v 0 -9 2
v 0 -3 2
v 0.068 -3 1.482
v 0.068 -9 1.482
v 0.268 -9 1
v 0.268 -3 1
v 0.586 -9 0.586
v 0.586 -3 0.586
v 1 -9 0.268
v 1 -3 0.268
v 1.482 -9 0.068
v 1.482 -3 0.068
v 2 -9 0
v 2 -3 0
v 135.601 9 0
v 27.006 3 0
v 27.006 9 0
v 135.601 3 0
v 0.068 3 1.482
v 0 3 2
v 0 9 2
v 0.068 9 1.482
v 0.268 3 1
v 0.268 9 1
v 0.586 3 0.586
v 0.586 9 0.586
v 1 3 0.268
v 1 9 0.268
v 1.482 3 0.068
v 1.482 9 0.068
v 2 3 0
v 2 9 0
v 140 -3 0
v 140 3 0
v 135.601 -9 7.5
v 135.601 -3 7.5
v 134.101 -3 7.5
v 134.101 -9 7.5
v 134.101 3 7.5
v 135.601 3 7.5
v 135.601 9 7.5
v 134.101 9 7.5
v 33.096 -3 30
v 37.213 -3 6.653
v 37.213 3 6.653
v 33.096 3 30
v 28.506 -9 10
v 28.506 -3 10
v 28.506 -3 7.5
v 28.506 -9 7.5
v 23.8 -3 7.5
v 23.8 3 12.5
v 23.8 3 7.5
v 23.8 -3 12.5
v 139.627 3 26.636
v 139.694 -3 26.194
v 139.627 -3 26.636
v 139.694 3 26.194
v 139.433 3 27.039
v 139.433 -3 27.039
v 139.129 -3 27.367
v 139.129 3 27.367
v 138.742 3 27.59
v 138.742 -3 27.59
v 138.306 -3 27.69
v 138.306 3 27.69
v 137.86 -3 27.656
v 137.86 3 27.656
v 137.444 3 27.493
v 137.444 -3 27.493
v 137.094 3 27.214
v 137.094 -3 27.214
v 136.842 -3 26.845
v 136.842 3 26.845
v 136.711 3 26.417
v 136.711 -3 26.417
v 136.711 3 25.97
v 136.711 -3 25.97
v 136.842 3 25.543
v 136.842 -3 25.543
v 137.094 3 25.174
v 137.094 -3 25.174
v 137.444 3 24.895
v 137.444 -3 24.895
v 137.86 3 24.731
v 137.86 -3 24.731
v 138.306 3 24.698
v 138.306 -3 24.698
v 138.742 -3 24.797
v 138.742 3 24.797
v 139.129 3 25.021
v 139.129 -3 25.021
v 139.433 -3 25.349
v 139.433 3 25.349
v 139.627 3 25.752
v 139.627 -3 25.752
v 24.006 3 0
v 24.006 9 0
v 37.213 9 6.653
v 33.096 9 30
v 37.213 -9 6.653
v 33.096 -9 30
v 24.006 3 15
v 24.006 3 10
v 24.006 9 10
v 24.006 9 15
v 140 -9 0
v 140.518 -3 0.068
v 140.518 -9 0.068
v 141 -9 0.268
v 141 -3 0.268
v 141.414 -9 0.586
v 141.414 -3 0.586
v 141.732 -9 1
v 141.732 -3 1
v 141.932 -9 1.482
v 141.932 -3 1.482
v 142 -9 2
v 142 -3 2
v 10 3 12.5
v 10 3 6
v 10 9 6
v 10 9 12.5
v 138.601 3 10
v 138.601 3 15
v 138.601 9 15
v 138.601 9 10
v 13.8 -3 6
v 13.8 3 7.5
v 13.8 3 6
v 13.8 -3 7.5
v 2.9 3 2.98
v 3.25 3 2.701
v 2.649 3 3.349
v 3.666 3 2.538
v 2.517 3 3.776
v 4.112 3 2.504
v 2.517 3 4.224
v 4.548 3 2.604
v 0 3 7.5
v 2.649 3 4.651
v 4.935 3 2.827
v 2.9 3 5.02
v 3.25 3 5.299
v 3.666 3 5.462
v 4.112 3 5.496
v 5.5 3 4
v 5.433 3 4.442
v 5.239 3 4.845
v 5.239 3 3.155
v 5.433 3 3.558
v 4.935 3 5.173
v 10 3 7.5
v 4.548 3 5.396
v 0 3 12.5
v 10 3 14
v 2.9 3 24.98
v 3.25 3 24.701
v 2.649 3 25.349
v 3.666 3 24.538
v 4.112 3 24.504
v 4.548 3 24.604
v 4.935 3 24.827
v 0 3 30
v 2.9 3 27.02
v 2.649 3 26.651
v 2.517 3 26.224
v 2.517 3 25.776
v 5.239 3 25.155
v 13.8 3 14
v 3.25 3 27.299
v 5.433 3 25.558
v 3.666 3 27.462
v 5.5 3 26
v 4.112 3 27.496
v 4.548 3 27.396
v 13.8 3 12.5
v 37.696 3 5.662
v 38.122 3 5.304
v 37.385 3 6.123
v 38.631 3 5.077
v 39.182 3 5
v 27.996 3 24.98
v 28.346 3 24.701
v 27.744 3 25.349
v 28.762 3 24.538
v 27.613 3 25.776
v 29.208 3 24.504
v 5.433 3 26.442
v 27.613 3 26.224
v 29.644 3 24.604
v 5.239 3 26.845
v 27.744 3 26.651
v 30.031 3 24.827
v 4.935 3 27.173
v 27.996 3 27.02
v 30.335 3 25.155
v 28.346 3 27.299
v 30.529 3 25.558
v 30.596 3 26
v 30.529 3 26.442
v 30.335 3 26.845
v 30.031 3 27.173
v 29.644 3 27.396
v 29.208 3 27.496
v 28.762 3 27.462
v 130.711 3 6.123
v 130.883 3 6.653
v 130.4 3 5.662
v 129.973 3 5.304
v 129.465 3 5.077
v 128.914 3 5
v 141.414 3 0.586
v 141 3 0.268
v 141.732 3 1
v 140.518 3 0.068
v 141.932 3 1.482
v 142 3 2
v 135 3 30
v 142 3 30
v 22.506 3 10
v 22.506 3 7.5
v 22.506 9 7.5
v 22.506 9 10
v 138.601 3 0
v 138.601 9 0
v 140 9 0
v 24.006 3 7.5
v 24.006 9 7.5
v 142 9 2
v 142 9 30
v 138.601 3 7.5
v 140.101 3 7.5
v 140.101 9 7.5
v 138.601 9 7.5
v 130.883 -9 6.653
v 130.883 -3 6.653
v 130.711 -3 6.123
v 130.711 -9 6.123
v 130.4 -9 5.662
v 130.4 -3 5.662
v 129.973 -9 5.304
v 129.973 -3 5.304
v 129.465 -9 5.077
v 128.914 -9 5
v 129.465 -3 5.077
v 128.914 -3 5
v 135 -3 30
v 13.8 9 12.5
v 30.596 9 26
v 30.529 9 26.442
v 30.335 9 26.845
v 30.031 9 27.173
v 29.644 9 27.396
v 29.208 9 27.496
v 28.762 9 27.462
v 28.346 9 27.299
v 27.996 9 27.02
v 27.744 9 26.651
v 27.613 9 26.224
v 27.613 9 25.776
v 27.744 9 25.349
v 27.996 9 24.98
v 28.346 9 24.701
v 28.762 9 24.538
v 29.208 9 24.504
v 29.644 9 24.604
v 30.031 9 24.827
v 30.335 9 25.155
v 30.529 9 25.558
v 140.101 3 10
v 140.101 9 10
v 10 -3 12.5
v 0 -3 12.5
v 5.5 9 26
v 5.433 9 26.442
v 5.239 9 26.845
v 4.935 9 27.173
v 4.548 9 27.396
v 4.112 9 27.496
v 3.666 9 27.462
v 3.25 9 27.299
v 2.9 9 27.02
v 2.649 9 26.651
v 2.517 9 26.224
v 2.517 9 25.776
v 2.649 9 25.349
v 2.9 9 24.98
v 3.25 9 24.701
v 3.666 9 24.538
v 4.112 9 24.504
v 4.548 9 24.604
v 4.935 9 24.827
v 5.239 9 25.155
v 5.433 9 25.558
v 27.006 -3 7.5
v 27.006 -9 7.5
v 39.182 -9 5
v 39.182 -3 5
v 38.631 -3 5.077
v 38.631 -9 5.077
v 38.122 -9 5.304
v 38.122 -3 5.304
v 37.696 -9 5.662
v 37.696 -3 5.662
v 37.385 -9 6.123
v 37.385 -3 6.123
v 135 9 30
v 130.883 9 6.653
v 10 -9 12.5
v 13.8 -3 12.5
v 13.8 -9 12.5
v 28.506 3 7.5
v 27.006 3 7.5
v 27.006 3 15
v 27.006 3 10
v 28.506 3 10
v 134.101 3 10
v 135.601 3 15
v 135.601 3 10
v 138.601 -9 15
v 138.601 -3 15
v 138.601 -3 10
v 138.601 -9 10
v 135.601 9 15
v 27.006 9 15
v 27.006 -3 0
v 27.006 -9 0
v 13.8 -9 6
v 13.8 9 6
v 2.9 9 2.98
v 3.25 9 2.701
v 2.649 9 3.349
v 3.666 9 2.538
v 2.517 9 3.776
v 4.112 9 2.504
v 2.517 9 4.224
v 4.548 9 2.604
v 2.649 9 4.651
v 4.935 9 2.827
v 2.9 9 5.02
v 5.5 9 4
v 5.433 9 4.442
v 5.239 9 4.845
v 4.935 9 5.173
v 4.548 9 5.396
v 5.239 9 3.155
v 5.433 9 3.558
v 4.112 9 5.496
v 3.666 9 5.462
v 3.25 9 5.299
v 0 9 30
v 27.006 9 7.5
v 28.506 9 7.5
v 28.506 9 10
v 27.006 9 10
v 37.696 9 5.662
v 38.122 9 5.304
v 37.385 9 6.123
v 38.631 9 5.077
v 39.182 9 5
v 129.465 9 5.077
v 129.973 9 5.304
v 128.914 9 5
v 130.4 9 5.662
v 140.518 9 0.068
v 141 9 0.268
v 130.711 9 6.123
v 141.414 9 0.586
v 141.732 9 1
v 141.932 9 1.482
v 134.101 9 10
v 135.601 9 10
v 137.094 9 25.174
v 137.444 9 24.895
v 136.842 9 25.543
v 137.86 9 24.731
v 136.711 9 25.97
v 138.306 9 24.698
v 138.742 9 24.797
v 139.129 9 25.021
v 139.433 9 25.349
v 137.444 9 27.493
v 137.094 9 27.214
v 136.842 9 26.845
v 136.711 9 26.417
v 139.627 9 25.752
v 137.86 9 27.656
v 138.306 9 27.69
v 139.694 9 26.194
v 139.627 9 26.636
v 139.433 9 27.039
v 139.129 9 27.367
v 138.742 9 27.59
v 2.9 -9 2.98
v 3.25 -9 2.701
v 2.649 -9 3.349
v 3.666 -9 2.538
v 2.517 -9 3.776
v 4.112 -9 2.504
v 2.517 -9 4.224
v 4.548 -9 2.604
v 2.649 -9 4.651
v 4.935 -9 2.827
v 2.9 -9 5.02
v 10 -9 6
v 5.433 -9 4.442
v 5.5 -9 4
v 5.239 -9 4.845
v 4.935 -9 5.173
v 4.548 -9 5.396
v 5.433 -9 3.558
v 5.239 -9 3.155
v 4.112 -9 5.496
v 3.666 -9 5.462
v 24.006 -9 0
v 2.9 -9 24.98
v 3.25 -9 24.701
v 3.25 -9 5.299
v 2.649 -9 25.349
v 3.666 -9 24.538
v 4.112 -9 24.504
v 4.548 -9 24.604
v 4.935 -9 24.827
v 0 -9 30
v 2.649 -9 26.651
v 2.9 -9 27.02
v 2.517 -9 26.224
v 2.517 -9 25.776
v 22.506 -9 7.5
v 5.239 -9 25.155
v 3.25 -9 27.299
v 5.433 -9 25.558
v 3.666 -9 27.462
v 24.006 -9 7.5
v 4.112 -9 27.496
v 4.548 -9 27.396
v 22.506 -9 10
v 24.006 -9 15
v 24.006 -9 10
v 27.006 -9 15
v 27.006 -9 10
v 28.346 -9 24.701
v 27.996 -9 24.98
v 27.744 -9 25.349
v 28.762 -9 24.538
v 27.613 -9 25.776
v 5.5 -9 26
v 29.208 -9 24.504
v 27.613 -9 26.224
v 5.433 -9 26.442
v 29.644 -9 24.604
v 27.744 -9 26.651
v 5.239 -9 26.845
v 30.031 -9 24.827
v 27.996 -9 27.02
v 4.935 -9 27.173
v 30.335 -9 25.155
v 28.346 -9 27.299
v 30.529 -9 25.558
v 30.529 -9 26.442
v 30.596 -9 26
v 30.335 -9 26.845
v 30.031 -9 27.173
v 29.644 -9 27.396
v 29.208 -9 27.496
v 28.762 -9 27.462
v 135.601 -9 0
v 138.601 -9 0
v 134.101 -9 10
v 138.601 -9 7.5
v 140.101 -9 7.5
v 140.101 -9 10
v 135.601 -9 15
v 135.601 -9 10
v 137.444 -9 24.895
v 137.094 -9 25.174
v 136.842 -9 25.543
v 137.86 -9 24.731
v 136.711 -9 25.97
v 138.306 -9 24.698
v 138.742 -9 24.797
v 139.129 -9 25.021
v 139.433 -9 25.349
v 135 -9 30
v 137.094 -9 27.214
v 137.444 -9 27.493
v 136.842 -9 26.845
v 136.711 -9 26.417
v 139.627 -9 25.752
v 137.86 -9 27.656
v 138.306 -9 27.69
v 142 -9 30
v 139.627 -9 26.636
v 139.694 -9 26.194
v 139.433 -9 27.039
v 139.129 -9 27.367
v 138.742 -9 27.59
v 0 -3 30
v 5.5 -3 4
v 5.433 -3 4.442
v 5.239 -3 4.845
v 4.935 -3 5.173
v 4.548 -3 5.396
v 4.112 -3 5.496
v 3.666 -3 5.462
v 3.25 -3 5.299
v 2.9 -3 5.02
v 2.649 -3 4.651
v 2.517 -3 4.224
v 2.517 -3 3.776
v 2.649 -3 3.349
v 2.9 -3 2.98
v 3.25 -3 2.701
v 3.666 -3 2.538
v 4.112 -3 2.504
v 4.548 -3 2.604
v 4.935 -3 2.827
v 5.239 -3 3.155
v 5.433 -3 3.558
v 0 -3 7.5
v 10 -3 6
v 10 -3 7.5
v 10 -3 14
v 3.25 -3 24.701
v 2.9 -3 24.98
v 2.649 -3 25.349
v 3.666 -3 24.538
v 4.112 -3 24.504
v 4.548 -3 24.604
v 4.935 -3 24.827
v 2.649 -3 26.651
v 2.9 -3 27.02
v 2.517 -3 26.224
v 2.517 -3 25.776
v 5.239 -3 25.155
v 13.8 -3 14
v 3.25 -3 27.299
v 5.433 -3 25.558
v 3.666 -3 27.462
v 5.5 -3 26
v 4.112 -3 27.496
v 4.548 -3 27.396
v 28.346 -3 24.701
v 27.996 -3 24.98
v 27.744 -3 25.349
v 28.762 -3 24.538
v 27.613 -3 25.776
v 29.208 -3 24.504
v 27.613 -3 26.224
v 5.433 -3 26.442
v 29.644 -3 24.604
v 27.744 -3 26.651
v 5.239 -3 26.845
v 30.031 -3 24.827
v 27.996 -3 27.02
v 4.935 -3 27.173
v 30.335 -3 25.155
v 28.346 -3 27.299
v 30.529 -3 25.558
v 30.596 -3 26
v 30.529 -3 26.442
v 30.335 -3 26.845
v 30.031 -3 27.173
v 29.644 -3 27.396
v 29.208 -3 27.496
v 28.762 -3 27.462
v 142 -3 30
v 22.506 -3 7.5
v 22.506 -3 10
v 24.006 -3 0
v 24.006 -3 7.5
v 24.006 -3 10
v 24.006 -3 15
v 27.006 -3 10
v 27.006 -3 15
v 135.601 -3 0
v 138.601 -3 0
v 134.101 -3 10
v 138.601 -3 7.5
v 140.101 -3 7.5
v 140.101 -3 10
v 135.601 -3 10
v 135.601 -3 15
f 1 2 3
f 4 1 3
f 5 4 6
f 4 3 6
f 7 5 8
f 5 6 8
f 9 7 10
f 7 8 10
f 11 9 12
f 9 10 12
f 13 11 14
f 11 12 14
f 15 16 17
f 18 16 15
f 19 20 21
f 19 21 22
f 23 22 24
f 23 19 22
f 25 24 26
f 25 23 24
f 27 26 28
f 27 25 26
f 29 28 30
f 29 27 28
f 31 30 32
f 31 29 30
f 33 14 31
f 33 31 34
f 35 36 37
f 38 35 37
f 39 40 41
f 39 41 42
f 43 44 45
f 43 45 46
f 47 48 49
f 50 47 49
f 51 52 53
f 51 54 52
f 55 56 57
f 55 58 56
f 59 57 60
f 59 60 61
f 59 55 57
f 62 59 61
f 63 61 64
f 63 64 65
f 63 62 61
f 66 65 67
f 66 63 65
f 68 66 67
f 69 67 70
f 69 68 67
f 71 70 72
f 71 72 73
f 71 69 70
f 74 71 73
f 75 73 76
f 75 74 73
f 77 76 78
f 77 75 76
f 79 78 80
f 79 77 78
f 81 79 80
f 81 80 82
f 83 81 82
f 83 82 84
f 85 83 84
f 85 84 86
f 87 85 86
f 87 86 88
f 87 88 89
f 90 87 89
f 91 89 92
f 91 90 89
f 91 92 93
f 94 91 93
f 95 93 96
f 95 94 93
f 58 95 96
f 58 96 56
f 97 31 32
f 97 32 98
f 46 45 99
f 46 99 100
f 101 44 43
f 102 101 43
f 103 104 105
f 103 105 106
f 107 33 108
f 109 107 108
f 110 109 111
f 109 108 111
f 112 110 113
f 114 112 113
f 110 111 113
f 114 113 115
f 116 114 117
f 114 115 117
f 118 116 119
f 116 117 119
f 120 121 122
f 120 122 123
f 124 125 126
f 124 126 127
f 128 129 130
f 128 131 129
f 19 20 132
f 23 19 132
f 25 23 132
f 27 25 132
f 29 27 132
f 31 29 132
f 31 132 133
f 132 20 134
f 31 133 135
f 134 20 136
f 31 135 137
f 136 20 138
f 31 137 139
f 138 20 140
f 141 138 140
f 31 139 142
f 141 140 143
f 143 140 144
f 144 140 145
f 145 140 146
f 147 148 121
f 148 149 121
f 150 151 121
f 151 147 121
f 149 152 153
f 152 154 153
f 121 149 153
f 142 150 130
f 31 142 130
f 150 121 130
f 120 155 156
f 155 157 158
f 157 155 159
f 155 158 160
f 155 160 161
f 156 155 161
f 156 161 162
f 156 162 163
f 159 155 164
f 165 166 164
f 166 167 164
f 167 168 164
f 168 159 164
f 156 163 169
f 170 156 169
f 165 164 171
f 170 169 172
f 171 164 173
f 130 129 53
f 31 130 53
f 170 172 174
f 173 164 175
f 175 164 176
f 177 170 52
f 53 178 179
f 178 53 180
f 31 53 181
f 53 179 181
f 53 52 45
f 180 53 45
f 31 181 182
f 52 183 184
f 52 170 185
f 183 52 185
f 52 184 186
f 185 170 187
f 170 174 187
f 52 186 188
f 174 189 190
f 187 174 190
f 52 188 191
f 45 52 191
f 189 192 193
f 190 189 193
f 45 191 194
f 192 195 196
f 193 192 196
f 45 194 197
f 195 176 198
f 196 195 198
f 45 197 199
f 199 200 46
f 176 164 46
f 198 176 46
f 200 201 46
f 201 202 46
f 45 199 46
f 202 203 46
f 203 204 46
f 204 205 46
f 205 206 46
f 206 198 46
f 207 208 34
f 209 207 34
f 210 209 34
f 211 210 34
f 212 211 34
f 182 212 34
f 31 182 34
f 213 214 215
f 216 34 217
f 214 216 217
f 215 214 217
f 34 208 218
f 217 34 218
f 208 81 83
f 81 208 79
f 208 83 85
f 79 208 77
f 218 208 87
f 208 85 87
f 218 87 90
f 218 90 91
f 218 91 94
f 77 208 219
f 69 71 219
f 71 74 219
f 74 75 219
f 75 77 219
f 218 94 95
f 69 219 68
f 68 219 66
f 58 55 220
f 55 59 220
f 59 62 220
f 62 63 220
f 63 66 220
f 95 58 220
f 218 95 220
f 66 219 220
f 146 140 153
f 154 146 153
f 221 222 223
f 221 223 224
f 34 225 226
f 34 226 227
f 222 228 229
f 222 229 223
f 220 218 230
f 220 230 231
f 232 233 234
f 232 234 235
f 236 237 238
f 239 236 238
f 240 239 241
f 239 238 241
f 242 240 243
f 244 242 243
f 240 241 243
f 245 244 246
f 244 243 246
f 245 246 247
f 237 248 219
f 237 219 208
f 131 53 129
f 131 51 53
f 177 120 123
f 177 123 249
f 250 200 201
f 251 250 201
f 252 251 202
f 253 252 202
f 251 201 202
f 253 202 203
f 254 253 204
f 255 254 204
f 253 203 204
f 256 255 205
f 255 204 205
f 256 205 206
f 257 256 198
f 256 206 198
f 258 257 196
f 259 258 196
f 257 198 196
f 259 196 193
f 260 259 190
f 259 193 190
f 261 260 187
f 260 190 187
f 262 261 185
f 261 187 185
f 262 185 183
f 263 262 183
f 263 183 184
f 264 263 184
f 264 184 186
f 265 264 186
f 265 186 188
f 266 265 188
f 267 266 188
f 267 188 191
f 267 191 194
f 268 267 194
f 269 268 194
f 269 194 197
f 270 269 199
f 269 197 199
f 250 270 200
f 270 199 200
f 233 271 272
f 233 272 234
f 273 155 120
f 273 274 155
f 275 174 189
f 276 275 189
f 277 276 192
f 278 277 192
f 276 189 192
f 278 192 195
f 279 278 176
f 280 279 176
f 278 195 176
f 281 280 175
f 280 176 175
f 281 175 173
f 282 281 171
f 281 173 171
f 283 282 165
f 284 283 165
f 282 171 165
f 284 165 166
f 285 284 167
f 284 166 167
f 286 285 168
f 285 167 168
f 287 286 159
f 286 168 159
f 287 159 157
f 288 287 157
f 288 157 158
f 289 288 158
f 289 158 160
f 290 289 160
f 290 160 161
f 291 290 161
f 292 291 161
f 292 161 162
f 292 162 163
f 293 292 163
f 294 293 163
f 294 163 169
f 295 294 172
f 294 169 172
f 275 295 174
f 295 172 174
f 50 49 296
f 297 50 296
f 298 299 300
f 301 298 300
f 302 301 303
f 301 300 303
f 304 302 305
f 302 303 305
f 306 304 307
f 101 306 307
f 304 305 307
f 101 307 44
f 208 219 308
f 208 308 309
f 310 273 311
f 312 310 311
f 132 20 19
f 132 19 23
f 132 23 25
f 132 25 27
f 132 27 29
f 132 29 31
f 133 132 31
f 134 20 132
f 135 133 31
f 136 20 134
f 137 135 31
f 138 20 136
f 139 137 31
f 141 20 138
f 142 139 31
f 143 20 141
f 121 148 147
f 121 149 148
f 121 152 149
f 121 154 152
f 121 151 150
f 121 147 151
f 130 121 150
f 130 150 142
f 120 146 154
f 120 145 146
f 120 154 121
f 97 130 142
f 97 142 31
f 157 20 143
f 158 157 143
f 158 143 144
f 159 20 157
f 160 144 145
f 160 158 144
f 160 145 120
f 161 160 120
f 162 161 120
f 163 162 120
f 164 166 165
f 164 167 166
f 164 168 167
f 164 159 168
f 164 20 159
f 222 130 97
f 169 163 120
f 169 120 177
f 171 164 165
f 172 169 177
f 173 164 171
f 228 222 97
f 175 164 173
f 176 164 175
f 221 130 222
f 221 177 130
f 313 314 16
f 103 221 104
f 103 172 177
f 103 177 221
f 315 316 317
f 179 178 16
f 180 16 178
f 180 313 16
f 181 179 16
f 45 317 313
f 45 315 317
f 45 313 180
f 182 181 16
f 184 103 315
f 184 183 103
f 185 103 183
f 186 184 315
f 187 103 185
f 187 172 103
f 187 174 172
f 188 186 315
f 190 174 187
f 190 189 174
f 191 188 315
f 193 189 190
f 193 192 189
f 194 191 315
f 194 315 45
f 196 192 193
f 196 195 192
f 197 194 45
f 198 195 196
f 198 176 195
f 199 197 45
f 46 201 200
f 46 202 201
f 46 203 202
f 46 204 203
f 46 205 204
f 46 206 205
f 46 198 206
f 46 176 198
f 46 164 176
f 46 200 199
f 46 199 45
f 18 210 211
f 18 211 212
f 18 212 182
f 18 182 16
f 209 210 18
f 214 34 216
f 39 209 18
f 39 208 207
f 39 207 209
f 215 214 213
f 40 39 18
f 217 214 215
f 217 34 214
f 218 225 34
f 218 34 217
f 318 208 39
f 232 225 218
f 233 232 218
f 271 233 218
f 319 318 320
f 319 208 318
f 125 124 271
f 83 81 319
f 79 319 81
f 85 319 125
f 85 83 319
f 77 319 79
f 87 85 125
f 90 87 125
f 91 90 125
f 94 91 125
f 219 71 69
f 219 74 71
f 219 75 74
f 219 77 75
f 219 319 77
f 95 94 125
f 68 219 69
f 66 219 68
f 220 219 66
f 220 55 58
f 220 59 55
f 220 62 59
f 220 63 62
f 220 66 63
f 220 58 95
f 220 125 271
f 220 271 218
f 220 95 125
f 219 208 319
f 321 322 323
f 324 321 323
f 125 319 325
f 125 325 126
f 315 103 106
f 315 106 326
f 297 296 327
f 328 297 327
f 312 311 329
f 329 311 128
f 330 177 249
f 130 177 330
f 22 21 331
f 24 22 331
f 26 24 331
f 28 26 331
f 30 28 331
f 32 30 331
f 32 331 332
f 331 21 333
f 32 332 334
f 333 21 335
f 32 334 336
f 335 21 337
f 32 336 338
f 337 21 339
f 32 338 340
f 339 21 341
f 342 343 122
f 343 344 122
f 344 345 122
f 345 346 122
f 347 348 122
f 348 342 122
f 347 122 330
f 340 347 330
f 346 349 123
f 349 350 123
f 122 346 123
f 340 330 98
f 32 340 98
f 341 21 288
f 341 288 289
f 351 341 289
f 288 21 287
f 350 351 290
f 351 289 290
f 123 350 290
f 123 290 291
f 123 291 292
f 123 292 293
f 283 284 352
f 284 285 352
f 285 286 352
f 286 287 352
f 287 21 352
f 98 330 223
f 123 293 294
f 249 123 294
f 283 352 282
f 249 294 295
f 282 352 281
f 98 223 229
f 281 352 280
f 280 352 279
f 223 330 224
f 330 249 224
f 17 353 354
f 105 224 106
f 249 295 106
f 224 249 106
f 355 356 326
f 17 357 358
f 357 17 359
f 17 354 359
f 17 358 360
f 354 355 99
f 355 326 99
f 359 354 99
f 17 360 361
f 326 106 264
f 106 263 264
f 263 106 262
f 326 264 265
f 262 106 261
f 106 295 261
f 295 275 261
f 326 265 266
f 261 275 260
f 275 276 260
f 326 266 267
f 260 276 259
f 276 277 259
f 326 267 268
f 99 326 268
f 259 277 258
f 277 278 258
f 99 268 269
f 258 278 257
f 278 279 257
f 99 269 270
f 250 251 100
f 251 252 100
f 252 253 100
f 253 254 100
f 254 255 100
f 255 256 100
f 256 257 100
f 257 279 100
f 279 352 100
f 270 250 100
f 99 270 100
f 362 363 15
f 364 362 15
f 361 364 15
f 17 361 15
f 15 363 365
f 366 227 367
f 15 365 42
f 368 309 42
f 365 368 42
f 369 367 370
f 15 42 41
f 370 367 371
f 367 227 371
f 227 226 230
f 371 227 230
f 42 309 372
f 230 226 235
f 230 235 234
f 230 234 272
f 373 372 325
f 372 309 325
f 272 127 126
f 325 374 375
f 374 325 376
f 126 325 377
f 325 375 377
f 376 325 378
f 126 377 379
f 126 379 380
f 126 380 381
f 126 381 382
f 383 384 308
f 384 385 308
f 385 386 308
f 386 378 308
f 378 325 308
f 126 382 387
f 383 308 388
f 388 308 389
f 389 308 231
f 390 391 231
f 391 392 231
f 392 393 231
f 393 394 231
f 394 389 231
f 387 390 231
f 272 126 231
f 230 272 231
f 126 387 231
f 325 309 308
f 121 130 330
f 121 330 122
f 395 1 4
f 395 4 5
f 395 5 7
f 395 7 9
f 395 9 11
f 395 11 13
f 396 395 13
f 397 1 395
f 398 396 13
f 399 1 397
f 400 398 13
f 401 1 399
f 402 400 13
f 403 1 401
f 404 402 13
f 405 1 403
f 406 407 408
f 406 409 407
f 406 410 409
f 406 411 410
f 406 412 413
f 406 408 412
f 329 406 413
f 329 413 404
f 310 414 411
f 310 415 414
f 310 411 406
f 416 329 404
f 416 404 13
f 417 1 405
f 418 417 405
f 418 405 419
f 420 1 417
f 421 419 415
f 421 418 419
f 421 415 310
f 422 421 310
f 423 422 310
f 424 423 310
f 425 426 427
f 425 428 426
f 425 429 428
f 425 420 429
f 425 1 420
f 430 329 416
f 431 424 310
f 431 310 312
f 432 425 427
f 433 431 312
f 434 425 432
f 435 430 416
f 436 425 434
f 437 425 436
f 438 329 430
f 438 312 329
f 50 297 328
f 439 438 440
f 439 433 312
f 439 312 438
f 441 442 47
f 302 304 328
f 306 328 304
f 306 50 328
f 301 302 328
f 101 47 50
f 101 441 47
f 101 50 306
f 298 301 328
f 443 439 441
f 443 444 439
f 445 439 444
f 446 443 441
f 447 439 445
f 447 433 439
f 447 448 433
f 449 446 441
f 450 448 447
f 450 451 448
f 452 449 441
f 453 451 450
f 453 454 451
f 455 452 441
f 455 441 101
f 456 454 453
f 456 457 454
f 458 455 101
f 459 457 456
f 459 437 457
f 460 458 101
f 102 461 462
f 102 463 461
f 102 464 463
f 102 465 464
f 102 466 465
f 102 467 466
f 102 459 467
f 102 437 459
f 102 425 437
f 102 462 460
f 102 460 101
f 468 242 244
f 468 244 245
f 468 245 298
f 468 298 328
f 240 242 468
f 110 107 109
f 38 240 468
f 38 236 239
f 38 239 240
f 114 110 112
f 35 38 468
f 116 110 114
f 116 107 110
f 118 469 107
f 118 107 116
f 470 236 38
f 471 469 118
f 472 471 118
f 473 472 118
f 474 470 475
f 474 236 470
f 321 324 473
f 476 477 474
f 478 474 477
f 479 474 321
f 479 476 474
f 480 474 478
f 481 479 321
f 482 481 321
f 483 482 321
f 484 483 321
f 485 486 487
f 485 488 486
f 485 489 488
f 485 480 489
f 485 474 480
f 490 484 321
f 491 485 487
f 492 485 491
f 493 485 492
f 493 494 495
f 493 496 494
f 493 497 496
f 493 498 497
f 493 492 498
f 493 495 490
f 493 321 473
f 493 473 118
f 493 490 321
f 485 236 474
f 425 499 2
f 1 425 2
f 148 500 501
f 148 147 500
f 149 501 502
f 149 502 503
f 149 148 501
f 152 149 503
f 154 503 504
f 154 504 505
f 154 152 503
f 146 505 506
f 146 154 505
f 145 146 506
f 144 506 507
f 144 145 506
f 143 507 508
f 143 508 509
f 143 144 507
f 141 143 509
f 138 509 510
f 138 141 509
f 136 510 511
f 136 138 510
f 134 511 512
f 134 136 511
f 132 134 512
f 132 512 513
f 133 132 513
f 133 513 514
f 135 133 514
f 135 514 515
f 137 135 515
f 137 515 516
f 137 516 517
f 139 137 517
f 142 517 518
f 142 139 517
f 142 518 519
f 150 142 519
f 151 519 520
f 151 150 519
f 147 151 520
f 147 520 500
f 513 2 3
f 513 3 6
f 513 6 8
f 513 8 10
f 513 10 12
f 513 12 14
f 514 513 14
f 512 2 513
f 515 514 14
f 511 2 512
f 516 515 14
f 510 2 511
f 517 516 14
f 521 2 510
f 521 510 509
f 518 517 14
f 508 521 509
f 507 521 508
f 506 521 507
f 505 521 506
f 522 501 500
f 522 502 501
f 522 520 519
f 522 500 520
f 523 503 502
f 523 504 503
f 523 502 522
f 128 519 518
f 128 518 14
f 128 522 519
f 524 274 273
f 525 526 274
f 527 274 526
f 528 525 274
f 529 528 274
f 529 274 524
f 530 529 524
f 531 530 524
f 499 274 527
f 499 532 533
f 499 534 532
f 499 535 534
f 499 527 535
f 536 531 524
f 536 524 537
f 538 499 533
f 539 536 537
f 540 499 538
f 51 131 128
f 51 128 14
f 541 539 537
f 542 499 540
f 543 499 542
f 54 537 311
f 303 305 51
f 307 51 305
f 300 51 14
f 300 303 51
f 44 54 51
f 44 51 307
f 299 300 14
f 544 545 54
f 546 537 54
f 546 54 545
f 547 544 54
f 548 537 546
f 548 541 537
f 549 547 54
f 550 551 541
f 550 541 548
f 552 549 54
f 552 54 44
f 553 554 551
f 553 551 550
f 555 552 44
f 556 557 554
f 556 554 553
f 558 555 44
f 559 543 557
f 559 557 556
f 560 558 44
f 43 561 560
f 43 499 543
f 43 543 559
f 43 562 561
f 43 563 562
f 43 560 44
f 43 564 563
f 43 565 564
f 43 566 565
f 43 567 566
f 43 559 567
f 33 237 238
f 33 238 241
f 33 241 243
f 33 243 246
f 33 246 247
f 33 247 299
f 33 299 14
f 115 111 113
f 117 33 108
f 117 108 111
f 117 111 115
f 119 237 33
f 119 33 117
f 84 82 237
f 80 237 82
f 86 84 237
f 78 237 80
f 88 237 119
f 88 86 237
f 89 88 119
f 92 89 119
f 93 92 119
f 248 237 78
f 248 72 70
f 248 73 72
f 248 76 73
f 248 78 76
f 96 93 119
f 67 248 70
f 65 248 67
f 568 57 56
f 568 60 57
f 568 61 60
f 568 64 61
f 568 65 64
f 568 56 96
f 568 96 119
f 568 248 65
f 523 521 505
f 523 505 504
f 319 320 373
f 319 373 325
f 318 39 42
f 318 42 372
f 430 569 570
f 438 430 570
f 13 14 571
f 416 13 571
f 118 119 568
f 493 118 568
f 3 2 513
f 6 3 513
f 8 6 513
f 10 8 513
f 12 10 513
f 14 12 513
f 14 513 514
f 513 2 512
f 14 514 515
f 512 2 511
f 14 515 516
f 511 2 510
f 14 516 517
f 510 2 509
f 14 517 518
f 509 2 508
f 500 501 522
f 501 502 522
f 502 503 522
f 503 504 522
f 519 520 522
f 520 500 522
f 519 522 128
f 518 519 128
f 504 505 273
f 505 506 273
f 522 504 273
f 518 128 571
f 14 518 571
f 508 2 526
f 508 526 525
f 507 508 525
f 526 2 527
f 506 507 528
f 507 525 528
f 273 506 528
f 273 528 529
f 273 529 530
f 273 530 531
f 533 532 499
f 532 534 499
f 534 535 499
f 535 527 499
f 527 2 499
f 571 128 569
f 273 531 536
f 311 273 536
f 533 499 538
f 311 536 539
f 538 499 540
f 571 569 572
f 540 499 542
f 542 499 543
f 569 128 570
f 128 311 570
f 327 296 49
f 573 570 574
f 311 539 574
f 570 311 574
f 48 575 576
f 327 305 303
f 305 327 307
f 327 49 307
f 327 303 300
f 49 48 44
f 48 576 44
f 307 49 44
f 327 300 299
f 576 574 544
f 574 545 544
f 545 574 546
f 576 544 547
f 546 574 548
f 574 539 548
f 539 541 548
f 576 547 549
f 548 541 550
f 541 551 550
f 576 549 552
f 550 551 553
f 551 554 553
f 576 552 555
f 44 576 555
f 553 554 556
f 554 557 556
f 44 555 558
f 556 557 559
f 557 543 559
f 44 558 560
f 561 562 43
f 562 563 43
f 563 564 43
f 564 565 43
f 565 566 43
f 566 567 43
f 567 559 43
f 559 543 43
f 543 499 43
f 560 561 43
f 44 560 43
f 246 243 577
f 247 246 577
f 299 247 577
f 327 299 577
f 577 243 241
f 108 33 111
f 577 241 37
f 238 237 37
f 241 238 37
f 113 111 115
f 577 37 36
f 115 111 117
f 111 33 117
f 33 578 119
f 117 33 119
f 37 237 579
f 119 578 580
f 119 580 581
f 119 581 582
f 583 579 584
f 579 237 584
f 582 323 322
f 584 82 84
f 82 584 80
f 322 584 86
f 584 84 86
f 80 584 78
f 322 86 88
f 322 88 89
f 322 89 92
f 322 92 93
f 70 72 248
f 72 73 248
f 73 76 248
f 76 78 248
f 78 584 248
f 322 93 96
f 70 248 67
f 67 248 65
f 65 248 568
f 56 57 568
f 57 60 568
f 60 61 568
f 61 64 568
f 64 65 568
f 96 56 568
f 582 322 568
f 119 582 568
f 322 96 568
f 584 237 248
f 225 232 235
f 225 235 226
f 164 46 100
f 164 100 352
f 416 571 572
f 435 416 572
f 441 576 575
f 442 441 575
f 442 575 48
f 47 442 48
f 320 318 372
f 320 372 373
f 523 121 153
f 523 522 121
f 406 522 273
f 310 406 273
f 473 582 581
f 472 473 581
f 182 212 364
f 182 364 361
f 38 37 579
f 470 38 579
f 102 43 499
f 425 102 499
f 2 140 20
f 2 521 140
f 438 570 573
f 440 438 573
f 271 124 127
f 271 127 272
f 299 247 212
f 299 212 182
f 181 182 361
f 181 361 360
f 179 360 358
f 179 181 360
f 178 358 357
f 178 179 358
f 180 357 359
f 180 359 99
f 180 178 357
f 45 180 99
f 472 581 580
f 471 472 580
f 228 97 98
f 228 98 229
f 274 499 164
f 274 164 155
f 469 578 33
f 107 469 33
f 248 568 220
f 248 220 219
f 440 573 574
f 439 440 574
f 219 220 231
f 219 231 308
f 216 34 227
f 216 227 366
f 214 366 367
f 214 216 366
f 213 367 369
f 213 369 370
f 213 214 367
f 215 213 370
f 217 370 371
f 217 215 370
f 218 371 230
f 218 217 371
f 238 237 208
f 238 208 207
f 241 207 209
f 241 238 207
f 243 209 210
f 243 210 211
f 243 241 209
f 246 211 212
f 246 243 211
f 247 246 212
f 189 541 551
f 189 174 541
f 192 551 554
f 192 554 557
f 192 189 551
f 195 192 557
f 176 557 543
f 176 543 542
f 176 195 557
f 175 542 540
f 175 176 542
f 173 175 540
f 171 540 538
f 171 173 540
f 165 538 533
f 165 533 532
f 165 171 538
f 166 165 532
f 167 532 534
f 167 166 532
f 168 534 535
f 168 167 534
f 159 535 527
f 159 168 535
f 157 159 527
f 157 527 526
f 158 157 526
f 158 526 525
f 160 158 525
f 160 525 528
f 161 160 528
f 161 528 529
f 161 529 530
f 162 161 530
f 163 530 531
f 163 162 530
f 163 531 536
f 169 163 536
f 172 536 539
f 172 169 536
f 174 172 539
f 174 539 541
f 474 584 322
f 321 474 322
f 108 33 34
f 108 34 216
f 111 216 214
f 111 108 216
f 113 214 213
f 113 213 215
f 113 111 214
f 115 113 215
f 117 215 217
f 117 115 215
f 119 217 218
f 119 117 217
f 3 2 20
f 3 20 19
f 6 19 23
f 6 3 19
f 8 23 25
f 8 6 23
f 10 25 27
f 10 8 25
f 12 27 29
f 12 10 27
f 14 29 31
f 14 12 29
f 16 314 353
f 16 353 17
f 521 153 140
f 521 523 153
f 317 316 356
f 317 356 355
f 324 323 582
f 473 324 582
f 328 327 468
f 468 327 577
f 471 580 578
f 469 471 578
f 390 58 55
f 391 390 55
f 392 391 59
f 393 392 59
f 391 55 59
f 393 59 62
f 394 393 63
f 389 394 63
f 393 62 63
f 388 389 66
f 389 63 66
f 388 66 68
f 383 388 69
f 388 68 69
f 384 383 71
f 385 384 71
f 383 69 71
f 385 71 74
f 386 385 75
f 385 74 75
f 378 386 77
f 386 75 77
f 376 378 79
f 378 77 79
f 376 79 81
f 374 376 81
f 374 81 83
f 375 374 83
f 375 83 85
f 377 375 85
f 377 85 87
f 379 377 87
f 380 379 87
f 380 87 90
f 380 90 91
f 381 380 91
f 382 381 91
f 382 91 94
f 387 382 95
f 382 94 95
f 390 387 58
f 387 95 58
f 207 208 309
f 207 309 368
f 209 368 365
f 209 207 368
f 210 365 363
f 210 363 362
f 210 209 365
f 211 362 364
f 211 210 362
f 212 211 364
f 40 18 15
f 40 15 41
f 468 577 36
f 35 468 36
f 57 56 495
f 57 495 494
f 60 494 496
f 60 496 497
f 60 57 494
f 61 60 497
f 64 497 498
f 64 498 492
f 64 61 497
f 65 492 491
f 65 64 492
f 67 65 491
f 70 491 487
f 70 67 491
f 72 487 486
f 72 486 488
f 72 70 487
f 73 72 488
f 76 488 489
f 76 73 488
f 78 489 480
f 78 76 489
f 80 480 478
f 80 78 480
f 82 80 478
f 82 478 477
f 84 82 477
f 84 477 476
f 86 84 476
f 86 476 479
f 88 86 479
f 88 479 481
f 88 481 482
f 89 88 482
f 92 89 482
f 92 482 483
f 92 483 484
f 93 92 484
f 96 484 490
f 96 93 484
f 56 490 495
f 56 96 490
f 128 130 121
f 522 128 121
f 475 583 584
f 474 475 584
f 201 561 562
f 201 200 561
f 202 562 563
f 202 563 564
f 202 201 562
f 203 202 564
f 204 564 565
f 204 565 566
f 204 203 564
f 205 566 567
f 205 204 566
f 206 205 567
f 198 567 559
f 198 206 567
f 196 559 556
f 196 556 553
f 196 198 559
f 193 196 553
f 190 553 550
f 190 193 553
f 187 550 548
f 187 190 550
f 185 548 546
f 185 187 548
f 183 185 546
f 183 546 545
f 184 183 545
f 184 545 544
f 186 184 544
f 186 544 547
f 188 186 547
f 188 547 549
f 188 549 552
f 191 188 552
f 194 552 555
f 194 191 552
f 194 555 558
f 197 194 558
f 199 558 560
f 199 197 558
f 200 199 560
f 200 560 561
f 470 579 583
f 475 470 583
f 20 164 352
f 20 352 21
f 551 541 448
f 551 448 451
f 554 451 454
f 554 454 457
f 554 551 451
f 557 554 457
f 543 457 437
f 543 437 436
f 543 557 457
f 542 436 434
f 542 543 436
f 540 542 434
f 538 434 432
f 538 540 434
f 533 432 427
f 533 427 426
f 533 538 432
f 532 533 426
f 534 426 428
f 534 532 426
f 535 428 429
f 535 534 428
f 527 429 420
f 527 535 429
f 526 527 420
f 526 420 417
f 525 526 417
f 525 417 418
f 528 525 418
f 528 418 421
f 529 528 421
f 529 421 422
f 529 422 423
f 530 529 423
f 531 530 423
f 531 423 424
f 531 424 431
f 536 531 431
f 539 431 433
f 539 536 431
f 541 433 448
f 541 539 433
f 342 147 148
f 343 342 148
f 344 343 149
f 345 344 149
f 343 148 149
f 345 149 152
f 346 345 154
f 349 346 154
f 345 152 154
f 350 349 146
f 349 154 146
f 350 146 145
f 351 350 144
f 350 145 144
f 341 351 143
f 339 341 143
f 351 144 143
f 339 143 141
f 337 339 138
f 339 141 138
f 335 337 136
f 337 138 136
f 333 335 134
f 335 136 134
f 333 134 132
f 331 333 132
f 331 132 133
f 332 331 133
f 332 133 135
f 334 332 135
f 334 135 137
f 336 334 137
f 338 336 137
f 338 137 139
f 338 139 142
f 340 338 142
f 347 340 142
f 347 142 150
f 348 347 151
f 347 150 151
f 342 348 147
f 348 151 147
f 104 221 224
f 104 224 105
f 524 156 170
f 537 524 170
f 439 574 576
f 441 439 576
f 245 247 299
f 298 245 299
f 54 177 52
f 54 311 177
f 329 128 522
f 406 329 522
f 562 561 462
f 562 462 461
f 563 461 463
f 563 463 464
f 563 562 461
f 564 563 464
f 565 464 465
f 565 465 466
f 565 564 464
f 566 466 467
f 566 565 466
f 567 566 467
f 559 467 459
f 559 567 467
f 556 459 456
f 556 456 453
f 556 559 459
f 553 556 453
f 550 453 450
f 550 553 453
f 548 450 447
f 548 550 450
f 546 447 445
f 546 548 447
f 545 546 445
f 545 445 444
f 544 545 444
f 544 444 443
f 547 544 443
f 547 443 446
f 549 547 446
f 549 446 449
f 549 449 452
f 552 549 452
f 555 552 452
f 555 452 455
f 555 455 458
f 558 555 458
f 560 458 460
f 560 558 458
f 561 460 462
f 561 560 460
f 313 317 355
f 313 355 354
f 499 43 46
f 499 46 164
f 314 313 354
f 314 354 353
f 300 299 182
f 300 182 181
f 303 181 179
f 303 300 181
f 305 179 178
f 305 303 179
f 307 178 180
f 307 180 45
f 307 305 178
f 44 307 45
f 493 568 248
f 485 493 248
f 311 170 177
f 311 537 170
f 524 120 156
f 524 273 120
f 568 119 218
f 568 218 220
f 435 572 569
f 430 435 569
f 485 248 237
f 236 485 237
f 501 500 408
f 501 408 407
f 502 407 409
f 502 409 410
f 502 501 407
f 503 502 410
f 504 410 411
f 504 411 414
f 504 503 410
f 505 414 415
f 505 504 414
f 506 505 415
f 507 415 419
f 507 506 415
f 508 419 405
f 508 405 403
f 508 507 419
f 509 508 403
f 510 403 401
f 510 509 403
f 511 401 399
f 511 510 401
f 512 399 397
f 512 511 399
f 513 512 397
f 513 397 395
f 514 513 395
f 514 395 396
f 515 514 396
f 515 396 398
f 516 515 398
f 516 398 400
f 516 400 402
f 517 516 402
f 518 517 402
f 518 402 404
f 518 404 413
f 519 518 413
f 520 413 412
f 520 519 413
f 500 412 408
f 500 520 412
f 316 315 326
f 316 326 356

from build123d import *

# Parameters (mm, degrees)
F0_R     = 1.5
F1_DEPTH = 3
F2_R     = 1.5
F2_W     = 10
F2_H     = 5
F2_W_2   = 3.8
F2_H_2   = 1.5
F3_DEPTH = 6


with BuildPart() as f1:
    # F0 (on Front) → F1 (new body, symmetric)
    with BuildSketch(Plane.XZ):
        with BuildLine():
            Line((0, 7.5), (0, 2))
            ThreePointArc((0, 2), (0.5857864376, 0.5857864376), (2, 0))
            Line((2, 0), (140, 0))
            ThreePointArc((140, 0), (141.4142135624, 0.5857864376), (142, 2))
            Line((142, 2), (142, 30))
            Line((142, 30), (135, 30))
            Line((135, 30), (130.883241726, 6.6527036447))
            ThreePointArc((130.883241726, 6.6527036447), (130.1992014393, 5.4679111138), (128.9136262199, 5))
            Line((128.9136262199, 5), (39.1822865212, 5))
            ThreePointArc((39.1822865212, 5), (37.8967113018, 5.4679111138), (37.2126710152, 6.6527036447))
            Line((37.2126710152, 6.6527036447), (33.0959127411, 30))
            Line((33.0959127411, 30), (0, 30))
            Line((0, 30), (0, 12.5))
            Line((0, 12.5), (10, 12.5))
            Line((10, 12.5), (10, 14))
            Line((10, 14), (13.8, 14))
            Line((13.8, 14), (13.8, 12.5))
            Line((13.8, 12.5), (23.8, 12.5))
            Line((23.8, 12.5), (23.8, 7.5))
            Line((23.8, 7.5), (13.8, 7.5))
            Line((13.8, 7.5), (13.8, 6))
            Line((13.8, 6), (10, 6))
            Line((10, 6), (10, 7.5))
            Line((10, 7.5), (0, 7.5))
        make_face()
        with Locations((4, 4)):
            Circle(F0_R, mode=Mode.SUBTRACT)
        with Locations((4, 26)):
            Circle(F0_R, mode=Mode.SUBTRACT)
        with Locations((29.0959127411, 26)):
            Circle(F0_R, mode=Mode.SUBTRACT)
        with Locations((138.1937896777, 26.1937896777)):
            Circle(F0_R, mode=Mode.SUBTRACT)
    extrude(amount=F1_DEPTH, both=True)


with BuildPart() as f3:
    # F2 (on face) → F3 (new body)
    with BuildSketch(Plane.XZ.offset(3)):
        with BuildLine():
            Line((33.0959127411, 30), (0, 30))
            Line((0, 30), (0, 12.5))
            Line((0, 12.5), (10, 12.5))
            Line((10, 12.5), (10, 14))
            Line((10, 14), (13.8, 14))
            Line((13.8, 14), (13.8, 12.5))
            Line((13.8, 12.5), (23.8, 12.5))
            Line((23.8, 12.5), (23.8, 10))
            Line((23.8, 10), (24.0063355076, 10))
            Line((24.0063355076, 10), (24.0063355076, 15))
            Line((24.0063355076, 15), (27.0063355076, 15))
            Line((27.0063355076, 15), (27.0063355076, 10))
            Line((27.0063355076, 10), (28.5063355076, 10))
            Line((28.5063355076, 10), (28.5063355076, 7.5))
            Line((28.5063355076, 7.5), (27.0063355076, 7.5))
            Line((27.0063355076, 7.5), (27.0063355076, 0))
            Line((27.0063355076, 0), (135.6005855076, 0))
            Line((135.6005855076, 0), (135.6005855076, 7.5))
            Line((135.6005855076, 7.5), (134.1005855076, 7.5))
            Line((134.1005855076, 7.5), (134.1005855076, 10))
            Line((134.1005855076, 10), (135.6005855076, 10))
            Line((135.6005855076, 10), (135.6005855076, 15))
            Line((135.6005855076, 15), (138.6005855076, 15))
            Line((138.6005855076, 15), (138.6005855076, 10))
            Line((138.6005855076, 10), (140.1005855076, 10))
            Line((140.1005855076, 10), (140.1005855076, 7.5))
            Line((140.1005855076, 7.5), (138.6005855076, 7.5))
            Line((138.6005855076, 7.5), (138.6005855076, 0))
            Line((138.6005855076, 0), (140, 0))
            ThreePointArc((140, 0), (141.4142135624, 0.5857864376), (142, 2))
            Line((142, 2), (142, 30))
            Line((142, 30), (135, 30))
            Line((135, 30), (130.883241726, 6.6527036447))
            ThreePointArc((130.883241726, 6.6527036447), (130.1992014393, 5.4679111138), (128.9136262199, 5))
            Line((128.9136262199, 5), (39.1822865212, 5))
            ThreePointArc((39.1822865212, 5), (37.8967113018, 5.4679111138), (37.2126710152, 6.6527036447))
            Line((37.2126710152, 6.6527036447), (33.0959127411, 30))
        make_face()
        with Locations((4, 26)):
            Circle(F2_R, mode=Mode.SUBTRACT)
        with Locations((29.0959127411, 26)):
            Circle(F2_R, mode=Mode.SUBTRACT)
        with Locations((138.1937896777, 26.1937896777)):
            Circle(F2_R, mode=Mode.SUBTRACT)
        with Locations((5, 10)):
            Rectangle(F2_W, F2_H)
        with Locations((11.9, 13.25)):
            Rectangle(F2_W_2, F2_H_2)
        Polygon((23.8, 12.5), (13.8, 12.5), (13.8, 7.5), (22.5063355076, 7.5), (22.5063355076, 10), (23.8, 10), align=None)
        with BuildLine():
            Line((10, 7.5), (0, 7.5))
            Line((0, 7.5), (0, 2))
            ThreePointArc((0, 2), (0.5857864376, 0.5857864376), (2, 0))
            Line((2, 0), (24.0063355076, 0))
            Line((24.0063355076, 0), (24.0063355076, 7.5))
            Line((24.0063355076, 7.5), (23.8, 7.5))
            Line((23.8, 7.5), (22.5063355076, 7.5))
            Line((22.5063355076, 7.5), (13.8, 7.5))
            Line((13.8, 7.5), (13.8, 6))
            Line((13.8, 6), (10, 6))
            Line((10, 6), (10, 7.5))
        make_face()
        with Locations((4, 4)):
            Circle(F2_R, mode=Mode.SUBTRACT)
    extrude(amount=F3_DEPTH)


with BuildPart() as f4_1:
    # F4: instance of F3
    add(f3.part.mirror(Plane.XZ))


solid = Compound([f1.part, f3.part, f4_1.part])
